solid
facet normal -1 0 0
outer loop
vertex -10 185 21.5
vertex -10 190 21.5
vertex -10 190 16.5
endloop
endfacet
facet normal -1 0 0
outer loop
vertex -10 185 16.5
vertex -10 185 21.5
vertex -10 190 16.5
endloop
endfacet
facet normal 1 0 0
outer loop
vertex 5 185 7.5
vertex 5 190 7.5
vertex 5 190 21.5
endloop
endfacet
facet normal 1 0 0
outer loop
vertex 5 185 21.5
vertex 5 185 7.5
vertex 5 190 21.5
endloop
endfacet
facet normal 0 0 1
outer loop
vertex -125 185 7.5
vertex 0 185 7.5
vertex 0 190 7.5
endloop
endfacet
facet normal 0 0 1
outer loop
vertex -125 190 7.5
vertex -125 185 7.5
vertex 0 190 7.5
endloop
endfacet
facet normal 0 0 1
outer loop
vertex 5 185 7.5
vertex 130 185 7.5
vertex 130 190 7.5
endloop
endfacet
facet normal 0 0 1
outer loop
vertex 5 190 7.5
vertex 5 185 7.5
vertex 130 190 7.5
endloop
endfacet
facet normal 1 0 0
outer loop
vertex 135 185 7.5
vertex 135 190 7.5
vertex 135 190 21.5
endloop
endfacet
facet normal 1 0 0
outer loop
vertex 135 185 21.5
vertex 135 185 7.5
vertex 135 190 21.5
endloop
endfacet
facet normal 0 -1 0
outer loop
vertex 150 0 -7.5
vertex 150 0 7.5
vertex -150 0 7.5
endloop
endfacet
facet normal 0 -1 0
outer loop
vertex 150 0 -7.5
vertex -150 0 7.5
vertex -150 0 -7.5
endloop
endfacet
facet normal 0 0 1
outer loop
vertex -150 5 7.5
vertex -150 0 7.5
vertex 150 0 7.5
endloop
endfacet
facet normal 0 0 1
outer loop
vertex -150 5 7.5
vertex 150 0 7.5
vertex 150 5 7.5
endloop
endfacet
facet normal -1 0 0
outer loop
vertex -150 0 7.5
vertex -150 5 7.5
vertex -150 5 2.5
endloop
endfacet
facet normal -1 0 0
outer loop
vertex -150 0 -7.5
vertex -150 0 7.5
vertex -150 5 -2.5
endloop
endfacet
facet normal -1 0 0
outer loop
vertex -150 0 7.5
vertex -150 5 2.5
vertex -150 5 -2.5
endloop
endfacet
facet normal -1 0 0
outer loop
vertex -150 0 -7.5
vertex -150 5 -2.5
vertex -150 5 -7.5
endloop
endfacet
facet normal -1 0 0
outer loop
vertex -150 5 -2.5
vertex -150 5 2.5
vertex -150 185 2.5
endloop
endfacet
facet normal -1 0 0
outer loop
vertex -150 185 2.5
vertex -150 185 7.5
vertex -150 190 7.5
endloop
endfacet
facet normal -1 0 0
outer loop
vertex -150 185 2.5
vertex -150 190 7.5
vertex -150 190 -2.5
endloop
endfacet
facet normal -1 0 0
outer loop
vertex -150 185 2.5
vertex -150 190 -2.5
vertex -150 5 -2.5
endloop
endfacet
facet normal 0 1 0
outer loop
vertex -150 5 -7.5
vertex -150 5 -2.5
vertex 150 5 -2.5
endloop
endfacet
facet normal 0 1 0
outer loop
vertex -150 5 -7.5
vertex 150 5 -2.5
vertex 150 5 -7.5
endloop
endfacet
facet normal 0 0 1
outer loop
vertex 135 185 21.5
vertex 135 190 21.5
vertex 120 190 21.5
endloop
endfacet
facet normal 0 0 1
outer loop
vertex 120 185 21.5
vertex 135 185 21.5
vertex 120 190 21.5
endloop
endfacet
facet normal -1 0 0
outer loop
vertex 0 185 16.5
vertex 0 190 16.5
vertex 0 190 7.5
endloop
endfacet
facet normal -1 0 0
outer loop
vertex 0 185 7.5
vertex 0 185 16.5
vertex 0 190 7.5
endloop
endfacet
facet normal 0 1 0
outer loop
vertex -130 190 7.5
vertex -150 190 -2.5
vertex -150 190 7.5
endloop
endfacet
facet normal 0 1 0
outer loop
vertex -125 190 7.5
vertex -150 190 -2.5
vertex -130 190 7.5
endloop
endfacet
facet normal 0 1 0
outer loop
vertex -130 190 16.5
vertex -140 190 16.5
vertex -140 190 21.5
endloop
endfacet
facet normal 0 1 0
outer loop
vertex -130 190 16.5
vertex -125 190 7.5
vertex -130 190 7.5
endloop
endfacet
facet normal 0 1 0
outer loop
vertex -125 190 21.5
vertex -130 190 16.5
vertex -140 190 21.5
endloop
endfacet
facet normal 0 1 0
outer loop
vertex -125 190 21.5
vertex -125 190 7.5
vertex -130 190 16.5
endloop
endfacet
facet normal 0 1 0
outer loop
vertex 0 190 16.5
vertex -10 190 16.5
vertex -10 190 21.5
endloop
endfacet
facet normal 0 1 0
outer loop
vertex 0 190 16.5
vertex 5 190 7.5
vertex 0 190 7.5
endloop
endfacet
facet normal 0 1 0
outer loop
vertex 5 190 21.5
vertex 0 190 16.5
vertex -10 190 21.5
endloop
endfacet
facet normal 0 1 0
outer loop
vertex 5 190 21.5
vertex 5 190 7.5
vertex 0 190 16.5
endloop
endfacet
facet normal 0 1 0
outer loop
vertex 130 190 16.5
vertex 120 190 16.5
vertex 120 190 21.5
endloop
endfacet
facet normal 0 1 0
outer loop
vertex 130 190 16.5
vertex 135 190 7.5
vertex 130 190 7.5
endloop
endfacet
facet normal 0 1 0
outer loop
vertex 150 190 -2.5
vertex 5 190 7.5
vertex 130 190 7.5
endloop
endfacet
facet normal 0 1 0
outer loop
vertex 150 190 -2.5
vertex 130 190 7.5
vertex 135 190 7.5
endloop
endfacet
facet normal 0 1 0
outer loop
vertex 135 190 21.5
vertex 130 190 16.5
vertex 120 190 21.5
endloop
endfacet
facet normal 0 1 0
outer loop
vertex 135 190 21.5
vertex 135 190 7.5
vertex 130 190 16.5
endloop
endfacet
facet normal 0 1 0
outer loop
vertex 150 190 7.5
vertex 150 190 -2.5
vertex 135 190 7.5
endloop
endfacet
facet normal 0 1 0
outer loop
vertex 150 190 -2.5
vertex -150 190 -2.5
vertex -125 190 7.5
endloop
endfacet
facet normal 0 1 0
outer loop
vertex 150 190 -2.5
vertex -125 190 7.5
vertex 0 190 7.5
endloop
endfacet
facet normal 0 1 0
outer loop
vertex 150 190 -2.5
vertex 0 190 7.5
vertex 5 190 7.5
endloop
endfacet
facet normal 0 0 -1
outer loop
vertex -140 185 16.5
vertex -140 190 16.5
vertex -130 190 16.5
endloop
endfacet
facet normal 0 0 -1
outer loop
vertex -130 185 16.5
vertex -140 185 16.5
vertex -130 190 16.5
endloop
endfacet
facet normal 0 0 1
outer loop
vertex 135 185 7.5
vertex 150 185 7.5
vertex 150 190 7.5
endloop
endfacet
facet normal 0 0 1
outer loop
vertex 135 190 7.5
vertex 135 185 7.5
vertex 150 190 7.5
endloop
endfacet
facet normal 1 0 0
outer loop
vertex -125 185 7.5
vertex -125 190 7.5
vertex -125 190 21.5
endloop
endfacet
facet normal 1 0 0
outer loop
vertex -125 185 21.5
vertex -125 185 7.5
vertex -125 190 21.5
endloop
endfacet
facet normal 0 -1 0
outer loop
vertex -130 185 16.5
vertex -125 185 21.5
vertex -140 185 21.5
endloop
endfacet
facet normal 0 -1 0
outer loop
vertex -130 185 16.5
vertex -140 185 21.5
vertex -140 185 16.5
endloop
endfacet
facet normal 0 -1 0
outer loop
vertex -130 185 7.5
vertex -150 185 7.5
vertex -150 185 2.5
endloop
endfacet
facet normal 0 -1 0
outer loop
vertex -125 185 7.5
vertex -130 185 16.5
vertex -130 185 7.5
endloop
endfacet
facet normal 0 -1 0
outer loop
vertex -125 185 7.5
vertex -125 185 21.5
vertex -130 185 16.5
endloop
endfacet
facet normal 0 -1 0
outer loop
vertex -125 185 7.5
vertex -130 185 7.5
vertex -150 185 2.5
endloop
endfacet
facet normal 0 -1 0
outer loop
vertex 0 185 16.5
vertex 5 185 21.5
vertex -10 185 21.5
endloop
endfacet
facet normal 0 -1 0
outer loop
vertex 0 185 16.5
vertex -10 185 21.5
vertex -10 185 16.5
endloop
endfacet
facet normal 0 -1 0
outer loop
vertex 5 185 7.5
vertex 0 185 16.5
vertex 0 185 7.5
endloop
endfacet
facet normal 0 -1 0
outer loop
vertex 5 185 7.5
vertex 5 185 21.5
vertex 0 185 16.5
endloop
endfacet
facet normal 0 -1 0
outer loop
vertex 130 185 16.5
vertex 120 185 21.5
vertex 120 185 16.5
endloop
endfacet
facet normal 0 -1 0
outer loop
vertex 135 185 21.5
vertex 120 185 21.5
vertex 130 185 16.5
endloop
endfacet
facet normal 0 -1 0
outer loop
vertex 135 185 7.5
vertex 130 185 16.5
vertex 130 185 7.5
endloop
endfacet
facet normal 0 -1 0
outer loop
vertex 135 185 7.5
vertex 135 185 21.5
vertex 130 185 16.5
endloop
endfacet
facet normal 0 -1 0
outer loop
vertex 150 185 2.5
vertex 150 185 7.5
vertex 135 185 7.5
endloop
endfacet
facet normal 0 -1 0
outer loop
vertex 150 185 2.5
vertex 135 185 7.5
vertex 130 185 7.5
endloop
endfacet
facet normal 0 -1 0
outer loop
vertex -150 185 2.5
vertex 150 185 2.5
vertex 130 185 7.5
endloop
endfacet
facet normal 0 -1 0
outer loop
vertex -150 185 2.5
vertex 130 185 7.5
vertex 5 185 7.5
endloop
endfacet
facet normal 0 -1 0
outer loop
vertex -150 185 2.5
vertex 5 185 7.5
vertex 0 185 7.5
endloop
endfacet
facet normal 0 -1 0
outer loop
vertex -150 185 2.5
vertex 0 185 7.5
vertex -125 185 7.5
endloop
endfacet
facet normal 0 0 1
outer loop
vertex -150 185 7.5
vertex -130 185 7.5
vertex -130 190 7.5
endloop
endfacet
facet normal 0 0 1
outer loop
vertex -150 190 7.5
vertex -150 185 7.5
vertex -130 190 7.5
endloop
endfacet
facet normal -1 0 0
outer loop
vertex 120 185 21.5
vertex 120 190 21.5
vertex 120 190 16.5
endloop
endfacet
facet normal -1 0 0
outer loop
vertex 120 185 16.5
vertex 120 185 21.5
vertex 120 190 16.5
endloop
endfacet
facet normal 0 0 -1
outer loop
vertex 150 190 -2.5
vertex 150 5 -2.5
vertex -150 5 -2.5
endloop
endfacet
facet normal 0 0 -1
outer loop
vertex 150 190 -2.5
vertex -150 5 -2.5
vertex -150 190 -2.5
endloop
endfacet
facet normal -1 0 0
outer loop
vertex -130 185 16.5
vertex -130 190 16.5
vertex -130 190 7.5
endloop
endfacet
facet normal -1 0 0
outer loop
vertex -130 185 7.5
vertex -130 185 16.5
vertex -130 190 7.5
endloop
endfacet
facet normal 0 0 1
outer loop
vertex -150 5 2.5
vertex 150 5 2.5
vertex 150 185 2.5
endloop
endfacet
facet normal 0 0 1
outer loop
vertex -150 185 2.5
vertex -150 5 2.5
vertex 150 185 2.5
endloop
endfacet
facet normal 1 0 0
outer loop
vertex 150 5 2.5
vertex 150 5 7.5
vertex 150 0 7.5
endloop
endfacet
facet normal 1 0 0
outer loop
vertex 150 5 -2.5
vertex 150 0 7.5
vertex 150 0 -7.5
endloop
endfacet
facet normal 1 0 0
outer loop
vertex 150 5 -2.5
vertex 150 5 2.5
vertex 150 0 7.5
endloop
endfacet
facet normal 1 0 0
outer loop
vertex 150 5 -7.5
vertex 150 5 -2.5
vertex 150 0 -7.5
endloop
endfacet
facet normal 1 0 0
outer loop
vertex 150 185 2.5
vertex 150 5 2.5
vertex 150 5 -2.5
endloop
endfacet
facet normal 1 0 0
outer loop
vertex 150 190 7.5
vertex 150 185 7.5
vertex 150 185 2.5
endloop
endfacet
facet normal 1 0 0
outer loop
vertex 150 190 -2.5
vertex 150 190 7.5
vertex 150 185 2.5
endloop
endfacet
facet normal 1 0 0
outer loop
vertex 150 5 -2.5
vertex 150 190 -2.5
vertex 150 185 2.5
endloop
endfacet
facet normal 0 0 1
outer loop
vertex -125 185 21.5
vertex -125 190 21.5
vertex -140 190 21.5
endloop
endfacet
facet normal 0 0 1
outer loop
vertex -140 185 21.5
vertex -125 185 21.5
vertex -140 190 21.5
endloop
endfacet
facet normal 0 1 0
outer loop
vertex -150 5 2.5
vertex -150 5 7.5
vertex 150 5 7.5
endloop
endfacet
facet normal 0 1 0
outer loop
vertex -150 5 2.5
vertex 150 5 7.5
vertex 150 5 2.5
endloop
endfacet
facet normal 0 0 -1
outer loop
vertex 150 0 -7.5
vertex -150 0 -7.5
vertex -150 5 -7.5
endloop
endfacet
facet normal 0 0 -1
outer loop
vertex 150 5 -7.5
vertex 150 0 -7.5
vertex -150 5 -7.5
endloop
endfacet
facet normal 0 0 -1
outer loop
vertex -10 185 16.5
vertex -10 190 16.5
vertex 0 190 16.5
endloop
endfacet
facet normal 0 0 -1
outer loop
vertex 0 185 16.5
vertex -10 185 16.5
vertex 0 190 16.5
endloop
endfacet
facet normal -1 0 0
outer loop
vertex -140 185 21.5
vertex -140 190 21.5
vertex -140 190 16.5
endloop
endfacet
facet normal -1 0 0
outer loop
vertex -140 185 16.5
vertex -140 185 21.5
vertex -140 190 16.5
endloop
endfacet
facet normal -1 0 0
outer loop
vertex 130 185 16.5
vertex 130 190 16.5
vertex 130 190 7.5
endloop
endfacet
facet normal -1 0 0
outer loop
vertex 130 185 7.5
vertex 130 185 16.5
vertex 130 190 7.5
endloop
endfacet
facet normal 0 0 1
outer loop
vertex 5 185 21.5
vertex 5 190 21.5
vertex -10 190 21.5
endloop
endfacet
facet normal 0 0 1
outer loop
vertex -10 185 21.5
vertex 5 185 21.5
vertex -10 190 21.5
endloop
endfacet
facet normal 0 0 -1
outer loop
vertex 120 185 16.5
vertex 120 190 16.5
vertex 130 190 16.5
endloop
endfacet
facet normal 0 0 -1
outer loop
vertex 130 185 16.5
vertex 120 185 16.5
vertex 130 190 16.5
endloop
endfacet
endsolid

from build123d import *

# Parameters (mm, degrees)
SKETCH1_W           = 5
SKETCH1_H           = 190
SKETCH1_H_2         = 5
BOSS_EXTRUDE1_DEPTH = 150
BOSS_EXTRUDE2_DEPTH = 5


with BuildPart() as part:
    # Sketch1 → Boss-Extrude1 (new, symmetric)
    with BuildSketch(Plane(origin=(0, 0, 0), x_dir=(0, 0, -1), z_dir=(1, 0, 0))):
        with Locations((0, 95)):
            Rectangle(SKETCH1_W, SKETCH1_H)
        with Locations((-5, 187.5)):
            Rectangle(SKETCH1_W, SKETCH1_H_2)
        with Locations((5, 2.5)):
            Rectangle(SKETCH1_W, SKETCH1_H_2)
        with Locations((-5, 2.5)):
            Rectangle(SKETCH1_W, SKETCH1_H_2)
    extrude(amount=BOSS_EXTRUDE1_DEPTH, both=True)

    # Sketch2 → Boss-Extrude2 (add)
    with BuildSketch(Plane(origin=(0, 190, 0), x_dir=(1, 0, 0), z_dir=(0, 1, 0))):
        Polygon((135, -7.5), (135, -21.5), (120, -21.5), (120, -16.5), (130, -16.5), (130, -7.5), align=None)
        Polygon((0, -7.5), (5, -7.5), (5, -21.5), (-10, -21.5), (-10, -16.5), (0, -16.5), align=None)
        Polygon((-130, -7.5), (-125, -7.5), (-125, -21.5), (-140, -21.5), (-140, -16.5), (-130, -16.5), align=None)
    extrude(amount=-BOSS_EXTRUDE2_DEPTH)


solid = part.part
